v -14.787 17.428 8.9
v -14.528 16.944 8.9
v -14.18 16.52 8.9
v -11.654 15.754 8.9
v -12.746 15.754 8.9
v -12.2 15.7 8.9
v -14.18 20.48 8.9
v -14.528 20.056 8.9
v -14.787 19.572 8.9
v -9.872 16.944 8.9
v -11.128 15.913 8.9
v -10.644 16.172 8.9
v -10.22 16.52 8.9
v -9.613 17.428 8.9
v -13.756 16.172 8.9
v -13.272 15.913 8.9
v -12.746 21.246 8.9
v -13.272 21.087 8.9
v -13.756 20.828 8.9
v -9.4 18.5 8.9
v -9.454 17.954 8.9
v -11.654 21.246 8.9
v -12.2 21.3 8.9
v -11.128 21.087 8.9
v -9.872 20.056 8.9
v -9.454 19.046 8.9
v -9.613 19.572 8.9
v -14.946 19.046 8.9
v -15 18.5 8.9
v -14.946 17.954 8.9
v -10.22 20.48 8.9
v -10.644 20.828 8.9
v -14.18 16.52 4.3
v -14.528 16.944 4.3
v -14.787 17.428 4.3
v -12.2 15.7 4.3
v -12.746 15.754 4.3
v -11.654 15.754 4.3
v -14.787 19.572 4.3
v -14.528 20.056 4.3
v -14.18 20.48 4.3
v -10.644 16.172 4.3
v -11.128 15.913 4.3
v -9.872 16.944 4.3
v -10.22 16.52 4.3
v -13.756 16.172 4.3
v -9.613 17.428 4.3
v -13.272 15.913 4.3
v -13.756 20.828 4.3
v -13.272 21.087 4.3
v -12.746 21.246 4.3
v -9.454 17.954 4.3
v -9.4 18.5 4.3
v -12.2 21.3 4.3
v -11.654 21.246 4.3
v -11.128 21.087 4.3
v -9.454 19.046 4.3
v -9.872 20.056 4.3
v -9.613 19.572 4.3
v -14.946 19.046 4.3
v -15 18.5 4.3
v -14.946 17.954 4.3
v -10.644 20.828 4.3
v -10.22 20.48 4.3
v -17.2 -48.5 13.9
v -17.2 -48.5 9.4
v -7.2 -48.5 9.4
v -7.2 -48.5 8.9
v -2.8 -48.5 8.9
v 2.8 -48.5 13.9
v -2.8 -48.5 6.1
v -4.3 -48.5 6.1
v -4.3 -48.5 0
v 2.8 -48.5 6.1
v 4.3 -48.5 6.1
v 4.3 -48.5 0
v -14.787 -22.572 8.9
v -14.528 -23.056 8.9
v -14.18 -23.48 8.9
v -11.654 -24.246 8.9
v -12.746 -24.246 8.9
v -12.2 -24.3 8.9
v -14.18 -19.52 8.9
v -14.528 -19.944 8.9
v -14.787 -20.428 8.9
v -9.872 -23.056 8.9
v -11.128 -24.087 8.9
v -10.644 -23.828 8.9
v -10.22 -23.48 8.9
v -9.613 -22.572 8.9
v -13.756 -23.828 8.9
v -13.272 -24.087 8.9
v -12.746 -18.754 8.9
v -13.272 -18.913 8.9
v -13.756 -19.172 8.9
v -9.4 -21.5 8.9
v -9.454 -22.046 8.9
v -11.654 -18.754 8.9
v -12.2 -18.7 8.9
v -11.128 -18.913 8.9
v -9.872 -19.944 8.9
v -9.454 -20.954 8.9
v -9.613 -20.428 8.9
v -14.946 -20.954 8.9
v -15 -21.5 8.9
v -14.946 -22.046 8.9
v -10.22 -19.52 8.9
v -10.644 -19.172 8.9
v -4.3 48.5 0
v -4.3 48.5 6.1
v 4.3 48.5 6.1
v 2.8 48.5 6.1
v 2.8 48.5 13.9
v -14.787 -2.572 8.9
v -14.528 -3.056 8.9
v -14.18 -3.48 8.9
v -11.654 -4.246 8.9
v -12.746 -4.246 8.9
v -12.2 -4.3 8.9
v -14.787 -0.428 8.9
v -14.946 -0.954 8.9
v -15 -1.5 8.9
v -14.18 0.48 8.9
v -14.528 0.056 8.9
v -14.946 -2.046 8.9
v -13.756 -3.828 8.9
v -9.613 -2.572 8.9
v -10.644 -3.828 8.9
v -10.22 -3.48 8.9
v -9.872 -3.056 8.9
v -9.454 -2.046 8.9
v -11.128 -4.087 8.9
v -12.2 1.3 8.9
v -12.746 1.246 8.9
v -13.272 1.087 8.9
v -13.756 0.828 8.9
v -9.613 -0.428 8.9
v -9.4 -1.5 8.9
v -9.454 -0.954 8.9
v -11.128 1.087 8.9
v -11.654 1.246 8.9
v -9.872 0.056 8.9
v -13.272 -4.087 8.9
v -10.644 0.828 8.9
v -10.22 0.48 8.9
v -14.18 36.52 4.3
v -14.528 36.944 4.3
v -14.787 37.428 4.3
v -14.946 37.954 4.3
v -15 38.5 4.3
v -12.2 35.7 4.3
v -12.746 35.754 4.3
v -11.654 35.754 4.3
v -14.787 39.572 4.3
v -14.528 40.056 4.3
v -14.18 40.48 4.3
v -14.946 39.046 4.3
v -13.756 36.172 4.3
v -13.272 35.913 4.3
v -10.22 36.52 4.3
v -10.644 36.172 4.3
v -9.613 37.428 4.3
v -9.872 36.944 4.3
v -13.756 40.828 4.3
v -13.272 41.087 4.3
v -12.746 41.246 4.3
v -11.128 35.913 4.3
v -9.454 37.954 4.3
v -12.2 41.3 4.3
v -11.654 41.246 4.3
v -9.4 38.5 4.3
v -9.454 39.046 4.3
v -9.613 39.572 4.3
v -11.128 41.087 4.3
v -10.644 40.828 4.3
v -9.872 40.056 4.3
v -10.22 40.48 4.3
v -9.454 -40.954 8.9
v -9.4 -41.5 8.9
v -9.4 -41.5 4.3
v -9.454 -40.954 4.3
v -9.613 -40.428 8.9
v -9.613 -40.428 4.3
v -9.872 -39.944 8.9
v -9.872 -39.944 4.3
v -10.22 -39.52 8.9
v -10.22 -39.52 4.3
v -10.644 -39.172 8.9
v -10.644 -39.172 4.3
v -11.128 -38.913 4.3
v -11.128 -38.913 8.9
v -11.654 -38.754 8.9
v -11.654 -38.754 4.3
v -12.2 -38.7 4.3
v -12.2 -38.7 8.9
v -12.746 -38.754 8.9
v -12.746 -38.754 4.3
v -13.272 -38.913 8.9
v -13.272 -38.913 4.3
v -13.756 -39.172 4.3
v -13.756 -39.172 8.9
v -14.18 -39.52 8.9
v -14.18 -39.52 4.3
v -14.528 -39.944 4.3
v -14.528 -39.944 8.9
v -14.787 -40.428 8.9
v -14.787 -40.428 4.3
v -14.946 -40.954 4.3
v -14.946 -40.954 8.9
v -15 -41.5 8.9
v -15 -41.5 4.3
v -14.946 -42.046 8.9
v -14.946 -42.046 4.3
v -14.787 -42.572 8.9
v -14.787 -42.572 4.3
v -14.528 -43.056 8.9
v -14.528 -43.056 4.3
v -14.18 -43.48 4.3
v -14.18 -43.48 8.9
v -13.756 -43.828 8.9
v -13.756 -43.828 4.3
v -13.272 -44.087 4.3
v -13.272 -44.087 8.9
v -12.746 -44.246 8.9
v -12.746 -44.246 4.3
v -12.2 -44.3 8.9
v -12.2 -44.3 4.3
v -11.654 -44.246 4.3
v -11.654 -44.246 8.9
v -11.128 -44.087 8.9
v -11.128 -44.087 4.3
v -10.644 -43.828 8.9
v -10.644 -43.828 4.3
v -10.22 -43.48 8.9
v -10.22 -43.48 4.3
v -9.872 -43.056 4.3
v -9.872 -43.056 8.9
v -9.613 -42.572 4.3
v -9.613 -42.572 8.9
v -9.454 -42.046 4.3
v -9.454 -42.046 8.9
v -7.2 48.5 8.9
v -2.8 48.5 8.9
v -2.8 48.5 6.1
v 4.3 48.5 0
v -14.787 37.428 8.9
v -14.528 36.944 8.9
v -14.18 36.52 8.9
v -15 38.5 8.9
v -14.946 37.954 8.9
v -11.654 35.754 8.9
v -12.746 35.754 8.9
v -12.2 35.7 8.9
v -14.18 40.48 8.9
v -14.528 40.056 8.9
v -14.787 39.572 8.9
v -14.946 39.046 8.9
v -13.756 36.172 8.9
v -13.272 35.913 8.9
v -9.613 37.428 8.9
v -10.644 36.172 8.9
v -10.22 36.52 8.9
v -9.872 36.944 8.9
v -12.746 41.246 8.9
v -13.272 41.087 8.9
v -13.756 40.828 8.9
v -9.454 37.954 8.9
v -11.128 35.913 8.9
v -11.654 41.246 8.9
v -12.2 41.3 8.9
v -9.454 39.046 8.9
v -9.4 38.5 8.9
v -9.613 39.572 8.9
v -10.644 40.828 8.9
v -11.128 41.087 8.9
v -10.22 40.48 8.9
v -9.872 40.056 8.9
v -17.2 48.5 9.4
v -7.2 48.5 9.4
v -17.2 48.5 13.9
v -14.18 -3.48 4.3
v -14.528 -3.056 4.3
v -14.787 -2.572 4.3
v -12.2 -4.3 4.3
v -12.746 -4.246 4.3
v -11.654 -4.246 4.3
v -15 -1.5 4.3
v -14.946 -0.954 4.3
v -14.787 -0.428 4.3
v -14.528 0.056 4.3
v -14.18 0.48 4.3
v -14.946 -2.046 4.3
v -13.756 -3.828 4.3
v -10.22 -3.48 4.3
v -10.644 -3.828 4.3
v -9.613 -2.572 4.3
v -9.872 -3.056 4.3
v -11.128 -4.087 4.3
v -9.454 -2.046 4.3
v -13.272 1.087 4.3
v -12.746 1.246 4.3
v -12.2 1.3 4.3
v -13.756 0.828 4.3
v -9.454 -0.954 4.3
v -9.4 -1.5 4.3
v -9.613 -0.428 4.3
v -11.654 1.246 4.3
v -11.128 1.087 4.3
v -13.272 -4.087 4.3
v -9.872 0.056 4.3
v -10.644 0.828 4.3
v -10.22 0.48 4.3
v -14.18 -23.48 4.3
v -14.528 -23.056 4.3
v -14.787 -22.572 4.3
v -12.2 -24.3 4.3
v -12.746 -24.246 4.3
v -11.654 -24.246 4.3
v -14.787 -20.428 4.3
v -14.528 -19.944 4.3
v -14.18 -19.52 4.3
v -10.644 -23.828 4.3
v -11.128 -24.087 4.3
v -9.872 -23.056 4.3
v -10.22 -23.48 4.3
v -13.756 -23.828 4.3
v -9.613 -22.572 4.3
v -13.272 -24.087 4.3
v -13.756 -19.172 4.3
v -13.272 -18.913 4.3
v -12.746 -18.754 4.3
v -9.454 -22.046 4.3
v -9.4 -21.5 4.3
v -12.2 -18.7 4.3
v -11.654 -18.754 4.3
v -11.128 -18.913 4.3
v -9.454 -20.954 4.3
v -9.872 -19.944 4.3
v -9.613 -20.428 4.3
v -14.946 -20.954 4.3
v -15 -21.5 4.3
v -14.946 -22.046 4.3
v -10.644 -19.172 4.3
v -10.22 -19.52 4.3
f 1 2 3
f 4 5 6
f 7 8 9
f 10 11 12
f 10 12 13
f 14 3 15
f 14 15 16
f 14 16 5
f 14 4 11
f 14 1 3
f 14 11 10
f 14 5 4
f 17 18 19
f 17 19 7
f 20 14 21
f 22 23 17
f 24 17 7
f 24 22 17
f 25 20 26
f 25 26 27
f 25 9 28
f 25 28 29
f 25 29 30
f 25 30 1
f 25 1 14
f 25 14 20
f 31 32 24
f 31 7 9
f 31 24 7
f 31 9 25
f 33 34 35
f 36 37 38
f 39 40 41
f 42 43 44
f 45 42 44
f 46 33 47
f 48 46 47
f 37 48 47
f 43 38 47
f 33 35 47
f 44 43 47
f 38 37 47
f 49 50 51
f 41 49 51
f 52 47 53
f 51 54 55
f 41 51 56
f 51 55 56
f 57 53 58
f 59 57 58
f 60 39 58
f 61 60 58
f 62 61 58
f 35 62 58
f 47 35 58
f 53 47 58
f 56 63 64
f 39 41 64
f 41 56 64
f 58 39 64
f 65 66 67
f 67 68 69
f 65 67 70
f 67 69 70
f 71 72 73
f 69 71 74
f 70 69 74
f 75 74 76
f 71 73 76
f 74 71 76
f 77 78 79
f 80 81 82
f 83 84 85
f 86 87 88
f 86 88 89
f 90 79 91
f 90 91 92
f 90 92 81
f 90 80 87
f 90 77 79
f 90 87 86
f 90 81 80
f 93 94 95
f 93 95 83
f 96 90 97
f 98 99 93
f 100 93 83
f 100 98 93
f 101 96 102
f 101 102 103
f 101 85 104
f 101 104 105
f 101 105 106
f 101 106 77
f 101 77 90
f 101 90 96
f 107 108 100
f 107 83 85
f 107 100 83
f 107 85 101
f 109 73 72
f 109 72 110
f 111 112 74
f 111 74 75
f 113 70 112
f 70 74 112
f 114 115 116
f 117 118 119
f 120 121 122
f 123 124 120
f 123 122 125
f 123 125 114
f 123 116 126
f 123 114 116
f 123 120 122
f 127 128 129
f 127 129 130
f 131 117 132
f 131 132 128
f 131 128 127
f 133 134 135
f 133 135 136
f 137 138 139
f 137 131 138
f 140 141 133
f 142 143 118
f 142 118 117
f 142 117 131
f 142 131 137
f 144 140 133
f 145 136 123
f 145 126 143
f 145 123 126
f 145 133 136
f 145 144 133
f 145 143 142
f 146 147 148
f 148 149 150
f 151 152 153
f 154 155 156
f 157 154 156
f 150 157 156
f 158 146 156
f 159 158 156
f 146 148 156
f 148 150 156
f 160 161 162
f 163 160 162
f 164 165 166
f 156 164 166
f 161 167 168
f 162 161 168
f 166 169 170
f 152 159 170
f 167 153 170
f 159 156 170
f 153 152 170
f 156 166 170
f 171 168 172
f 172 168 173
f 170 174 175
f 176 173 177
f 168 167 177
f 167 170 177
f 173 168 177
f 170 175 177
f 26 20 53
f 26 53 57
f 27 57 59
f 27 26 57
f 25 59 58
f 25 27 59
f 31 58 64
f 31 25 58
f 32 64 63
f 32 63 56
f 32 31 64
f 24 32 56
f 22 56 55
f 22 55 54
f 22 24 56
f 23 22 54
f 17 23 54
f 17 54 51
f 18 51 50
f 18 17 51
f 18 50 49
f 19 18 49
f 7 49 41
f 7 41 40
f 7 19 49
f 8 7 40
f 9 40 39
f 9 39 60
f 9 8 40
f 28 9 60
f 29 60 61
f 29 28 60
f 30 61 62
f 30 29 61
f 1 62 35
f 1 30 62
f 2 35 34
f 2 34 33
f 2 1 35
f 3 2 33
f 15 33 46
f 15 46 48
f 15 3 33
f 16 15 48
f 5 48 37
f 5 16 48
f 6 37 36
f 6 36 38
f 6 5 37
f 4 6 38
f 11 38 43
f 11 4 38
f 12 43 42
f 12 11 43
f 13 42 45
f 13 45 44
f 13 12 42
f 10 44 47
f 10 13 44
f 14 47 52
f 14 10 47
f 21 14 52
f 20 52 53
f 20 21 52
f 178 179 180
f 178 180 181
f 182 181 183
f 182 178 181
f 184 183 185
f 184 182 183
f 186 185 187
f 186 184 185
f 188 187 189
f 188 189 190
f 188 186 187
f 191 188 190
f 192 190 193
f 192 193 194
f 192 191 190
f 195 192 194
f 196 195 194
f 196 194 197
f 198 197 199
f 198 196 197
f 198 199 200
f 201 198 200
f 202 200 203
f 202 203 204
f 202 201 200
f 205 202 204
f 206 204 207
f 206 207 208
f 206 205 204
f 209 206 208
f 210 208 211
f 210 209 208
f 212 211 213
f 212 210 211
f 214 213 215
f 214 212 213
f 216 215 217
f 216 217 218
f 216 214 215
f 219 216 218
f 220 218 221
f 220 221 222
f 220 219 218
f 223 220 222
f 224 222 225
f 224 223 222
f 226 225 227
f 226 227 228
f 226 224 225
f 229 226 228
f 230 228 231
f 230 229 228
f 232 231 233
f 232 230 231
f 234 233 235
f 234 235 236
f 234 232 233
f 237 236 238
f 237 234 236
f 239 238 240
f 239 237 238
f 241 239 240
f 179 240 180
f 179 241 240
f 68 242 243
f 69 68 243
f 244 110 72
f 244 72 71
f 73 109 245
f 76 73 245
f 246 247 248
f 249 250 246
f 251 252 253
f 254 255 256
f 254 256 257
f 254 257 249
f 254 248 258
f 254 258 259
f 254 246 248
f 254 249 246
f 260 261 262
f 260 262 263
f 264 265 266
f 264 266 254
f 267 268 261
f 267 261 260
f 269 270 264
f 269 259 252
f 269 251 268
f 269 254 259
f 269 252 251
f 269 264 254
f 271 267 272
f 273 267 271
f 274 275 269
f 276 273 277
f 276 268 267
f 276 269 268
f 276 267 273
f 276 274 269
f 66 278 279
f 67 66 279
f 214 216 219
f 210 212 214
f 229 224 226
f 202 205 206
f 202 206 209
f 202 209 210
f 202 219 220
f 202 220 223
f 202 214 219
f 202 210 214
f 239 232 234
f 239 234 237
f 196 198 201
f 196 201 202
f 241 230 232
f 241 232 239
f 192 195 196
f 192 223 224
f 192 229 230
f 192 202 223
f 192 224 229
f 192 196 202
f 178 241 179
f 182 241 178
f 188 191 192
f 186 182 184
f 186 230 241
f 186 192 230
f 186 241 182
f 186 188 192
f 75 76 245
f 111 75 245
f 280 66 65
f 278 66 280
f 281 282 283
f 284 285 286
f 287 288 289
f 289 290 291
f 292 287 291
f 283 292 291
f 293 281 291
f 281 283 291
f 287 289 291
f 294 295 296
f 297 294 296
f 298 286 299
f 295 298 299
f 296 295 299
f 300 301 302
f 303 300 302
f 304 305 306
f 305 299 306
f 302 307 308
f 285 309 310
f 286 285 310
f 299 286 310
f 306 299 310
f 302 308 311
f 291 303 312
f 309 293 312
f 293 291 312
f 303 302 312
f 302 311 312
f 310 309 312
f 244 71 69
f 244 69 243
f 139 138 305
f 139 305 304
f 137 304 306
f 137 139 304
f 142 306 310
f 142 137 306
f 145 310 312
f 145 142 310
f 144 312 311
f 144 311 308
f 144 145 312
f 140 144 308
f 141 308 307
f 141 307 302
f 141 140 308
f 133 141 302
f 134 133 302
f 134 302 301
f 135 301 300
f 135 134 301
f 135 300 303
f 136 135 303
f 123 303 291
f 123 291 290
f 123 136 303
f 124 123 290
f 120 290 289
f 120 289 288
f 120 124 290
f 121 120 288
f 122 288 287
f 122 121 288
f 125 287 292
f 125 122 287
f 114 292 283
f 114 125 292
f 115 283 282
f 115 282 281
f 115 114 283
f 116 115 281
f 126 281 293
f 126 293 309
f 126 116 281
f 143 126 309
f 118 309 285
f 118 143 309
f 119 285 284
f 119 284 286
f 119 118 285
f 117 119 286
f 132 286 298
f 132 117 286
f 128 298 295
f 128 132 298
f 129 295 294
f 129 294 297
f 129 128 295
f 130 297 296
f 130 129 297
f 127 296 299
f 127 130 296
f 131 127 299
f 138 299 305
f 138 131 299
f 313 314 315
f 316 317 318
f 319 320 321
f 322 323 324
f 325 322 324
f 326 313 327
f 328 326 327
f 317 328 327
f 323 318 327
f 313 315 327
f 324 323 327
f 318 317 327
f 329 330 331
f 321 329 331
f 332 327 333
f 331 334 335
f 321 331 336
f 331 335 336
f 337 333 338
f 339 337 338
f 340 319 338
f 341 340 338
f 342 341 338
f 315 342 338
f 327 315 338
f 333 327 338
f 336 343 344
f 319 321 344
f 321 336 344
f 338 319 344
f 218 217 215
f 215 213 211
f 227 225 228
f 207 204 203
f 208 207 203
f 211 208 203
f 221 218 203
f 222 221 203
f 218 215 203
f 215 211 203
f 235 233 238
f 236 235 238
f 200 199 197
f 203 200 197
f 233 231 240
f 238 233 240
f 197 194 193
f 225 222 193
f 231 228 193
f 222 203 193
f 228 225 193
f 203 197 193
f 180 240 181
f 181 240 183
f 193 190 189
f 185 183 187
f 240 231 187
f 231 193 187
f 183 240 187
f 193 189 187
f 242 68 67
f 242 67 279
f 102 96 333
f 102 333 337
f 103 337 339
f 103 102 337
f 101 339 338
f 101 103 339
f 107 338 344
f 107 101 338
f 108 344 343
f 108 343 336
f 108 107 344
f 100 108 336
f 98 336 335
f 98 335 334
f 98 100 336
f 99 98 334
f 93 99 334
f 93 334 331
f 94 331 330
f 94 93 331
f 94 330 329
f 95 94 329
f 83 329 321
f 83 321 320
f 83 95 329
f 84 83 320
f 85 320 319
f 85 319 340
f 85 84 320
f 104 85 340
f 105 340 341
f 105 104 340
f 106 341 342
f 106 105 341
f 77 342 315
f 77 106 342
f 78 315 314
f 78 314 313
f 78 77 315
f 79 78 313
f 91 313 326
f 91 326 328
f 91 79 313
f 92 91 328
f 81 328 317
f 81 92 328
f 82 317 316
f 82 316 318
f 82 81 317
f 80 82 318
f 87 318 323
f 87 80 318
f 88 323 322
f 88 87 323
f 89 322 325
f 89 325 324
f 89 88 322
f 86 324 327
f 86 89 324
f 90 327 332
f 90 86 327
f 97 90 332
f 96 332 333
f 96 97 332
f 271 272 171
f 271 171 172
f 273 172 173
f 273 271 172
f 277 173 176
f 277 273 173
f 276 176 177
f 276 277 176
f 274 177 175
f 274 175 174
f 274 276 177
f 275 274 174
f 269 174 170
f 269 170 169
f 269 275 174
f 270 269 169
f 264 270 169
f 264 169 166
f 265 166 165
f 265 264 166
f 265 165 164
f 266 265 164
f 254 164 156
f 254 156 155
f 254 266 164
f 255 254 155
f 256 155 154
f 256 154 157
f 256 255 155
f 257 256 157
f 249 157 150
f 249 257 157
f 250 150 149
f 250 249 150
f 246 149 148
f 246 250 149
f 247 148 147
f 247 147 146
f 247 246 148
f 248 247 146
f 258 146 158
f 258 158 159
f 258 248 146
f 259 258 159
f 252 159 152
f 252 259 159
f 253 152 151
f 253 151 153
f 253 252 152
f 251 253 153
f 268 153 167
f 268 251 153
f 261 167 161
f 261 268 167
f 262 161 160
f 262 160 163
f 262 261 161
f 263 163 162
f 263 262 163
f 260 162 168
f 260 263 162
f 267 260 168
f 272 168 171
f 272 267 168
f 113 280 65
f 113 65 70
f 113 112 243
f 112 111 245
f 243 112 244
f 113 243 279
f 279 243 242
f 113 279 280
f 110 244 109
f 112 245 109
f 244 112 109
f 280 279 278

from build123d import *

# Parameters (mm, degrees)
F0_W     = 8.6
F0_H     = 97
F1_DEPTH = 6.1
F2_W     = 5.6
F2_H     = 97
F3_DEPTH = 2.8
F4_W     = 10
F4_H     = 97
F4_W_2   = 5.6
F4_W_3   = 1.5
F4_W_4   = 2.9
F5_DEPTH = 5
F6_DEPTH = 0.5
F7_R     = 2.8
F8_DEPTH = 4.6


with BuildPart() as f1:
    # F0 (on Top) → F1 (new body)
    with BuildSketch(Plane.XY):
        Rectangle(F0_W, F0_H)
    extrude(amount=F1_DEPTH)

    # F2 (on face) → F3 (join)
    with BuildSketch(Plane.XY.offset(6.1)):
        Rectangle(F2_W, F2_H)
    extrude(amount=F3_DEPTH)

    # F4 (on face) → F5 (join)
    with BuildSketch(Plane.XY.offset(8.9)):
        with Locations((-12.2, 0)):
            Rectangle(F4_W, F4_H)
        Rectangle(F4_W_2, F4_H)
        with Locations((-3.55, 0)):
            Rectangle(F4_W_3, F4_H)
        with Locations((-5.75, 0)):
            Rectangle(F4_W_4, F4_H)
    extrude(amount=F5_DEPTH)

    # F4 (on face) → F6 (cut)
    with BuildSketch(Plane.XY.offset(8.9)):
        with Locations((-12.2, 0)):
            Rectangle(F4_W, F4_H)
    extrude(amount=F6_DEPTH, mode=Mode.SUBTRACT)


with BuildPart() as f8:
    # F7 (on face) → F8 (new body)
    with BuildSketch(Plane.XY.offset(8.9)):
        with Locations((-12.2, 18.5)):
            Circle(F7_R)
        with Locations((-12.2, -1.5)):
            Circle(F7_R)
        with Locations((-12.2, -21.5)):
            Circle(F7_R)
        with Locations((-12.2, -41.5)):
            Circle(F7_R)
        with Locations((-12.2, 38.5)):
            Circle(F7_R)
    extrude(amount=-F8_DEPTH)


solid = Compound([f1.part, f8.part])
